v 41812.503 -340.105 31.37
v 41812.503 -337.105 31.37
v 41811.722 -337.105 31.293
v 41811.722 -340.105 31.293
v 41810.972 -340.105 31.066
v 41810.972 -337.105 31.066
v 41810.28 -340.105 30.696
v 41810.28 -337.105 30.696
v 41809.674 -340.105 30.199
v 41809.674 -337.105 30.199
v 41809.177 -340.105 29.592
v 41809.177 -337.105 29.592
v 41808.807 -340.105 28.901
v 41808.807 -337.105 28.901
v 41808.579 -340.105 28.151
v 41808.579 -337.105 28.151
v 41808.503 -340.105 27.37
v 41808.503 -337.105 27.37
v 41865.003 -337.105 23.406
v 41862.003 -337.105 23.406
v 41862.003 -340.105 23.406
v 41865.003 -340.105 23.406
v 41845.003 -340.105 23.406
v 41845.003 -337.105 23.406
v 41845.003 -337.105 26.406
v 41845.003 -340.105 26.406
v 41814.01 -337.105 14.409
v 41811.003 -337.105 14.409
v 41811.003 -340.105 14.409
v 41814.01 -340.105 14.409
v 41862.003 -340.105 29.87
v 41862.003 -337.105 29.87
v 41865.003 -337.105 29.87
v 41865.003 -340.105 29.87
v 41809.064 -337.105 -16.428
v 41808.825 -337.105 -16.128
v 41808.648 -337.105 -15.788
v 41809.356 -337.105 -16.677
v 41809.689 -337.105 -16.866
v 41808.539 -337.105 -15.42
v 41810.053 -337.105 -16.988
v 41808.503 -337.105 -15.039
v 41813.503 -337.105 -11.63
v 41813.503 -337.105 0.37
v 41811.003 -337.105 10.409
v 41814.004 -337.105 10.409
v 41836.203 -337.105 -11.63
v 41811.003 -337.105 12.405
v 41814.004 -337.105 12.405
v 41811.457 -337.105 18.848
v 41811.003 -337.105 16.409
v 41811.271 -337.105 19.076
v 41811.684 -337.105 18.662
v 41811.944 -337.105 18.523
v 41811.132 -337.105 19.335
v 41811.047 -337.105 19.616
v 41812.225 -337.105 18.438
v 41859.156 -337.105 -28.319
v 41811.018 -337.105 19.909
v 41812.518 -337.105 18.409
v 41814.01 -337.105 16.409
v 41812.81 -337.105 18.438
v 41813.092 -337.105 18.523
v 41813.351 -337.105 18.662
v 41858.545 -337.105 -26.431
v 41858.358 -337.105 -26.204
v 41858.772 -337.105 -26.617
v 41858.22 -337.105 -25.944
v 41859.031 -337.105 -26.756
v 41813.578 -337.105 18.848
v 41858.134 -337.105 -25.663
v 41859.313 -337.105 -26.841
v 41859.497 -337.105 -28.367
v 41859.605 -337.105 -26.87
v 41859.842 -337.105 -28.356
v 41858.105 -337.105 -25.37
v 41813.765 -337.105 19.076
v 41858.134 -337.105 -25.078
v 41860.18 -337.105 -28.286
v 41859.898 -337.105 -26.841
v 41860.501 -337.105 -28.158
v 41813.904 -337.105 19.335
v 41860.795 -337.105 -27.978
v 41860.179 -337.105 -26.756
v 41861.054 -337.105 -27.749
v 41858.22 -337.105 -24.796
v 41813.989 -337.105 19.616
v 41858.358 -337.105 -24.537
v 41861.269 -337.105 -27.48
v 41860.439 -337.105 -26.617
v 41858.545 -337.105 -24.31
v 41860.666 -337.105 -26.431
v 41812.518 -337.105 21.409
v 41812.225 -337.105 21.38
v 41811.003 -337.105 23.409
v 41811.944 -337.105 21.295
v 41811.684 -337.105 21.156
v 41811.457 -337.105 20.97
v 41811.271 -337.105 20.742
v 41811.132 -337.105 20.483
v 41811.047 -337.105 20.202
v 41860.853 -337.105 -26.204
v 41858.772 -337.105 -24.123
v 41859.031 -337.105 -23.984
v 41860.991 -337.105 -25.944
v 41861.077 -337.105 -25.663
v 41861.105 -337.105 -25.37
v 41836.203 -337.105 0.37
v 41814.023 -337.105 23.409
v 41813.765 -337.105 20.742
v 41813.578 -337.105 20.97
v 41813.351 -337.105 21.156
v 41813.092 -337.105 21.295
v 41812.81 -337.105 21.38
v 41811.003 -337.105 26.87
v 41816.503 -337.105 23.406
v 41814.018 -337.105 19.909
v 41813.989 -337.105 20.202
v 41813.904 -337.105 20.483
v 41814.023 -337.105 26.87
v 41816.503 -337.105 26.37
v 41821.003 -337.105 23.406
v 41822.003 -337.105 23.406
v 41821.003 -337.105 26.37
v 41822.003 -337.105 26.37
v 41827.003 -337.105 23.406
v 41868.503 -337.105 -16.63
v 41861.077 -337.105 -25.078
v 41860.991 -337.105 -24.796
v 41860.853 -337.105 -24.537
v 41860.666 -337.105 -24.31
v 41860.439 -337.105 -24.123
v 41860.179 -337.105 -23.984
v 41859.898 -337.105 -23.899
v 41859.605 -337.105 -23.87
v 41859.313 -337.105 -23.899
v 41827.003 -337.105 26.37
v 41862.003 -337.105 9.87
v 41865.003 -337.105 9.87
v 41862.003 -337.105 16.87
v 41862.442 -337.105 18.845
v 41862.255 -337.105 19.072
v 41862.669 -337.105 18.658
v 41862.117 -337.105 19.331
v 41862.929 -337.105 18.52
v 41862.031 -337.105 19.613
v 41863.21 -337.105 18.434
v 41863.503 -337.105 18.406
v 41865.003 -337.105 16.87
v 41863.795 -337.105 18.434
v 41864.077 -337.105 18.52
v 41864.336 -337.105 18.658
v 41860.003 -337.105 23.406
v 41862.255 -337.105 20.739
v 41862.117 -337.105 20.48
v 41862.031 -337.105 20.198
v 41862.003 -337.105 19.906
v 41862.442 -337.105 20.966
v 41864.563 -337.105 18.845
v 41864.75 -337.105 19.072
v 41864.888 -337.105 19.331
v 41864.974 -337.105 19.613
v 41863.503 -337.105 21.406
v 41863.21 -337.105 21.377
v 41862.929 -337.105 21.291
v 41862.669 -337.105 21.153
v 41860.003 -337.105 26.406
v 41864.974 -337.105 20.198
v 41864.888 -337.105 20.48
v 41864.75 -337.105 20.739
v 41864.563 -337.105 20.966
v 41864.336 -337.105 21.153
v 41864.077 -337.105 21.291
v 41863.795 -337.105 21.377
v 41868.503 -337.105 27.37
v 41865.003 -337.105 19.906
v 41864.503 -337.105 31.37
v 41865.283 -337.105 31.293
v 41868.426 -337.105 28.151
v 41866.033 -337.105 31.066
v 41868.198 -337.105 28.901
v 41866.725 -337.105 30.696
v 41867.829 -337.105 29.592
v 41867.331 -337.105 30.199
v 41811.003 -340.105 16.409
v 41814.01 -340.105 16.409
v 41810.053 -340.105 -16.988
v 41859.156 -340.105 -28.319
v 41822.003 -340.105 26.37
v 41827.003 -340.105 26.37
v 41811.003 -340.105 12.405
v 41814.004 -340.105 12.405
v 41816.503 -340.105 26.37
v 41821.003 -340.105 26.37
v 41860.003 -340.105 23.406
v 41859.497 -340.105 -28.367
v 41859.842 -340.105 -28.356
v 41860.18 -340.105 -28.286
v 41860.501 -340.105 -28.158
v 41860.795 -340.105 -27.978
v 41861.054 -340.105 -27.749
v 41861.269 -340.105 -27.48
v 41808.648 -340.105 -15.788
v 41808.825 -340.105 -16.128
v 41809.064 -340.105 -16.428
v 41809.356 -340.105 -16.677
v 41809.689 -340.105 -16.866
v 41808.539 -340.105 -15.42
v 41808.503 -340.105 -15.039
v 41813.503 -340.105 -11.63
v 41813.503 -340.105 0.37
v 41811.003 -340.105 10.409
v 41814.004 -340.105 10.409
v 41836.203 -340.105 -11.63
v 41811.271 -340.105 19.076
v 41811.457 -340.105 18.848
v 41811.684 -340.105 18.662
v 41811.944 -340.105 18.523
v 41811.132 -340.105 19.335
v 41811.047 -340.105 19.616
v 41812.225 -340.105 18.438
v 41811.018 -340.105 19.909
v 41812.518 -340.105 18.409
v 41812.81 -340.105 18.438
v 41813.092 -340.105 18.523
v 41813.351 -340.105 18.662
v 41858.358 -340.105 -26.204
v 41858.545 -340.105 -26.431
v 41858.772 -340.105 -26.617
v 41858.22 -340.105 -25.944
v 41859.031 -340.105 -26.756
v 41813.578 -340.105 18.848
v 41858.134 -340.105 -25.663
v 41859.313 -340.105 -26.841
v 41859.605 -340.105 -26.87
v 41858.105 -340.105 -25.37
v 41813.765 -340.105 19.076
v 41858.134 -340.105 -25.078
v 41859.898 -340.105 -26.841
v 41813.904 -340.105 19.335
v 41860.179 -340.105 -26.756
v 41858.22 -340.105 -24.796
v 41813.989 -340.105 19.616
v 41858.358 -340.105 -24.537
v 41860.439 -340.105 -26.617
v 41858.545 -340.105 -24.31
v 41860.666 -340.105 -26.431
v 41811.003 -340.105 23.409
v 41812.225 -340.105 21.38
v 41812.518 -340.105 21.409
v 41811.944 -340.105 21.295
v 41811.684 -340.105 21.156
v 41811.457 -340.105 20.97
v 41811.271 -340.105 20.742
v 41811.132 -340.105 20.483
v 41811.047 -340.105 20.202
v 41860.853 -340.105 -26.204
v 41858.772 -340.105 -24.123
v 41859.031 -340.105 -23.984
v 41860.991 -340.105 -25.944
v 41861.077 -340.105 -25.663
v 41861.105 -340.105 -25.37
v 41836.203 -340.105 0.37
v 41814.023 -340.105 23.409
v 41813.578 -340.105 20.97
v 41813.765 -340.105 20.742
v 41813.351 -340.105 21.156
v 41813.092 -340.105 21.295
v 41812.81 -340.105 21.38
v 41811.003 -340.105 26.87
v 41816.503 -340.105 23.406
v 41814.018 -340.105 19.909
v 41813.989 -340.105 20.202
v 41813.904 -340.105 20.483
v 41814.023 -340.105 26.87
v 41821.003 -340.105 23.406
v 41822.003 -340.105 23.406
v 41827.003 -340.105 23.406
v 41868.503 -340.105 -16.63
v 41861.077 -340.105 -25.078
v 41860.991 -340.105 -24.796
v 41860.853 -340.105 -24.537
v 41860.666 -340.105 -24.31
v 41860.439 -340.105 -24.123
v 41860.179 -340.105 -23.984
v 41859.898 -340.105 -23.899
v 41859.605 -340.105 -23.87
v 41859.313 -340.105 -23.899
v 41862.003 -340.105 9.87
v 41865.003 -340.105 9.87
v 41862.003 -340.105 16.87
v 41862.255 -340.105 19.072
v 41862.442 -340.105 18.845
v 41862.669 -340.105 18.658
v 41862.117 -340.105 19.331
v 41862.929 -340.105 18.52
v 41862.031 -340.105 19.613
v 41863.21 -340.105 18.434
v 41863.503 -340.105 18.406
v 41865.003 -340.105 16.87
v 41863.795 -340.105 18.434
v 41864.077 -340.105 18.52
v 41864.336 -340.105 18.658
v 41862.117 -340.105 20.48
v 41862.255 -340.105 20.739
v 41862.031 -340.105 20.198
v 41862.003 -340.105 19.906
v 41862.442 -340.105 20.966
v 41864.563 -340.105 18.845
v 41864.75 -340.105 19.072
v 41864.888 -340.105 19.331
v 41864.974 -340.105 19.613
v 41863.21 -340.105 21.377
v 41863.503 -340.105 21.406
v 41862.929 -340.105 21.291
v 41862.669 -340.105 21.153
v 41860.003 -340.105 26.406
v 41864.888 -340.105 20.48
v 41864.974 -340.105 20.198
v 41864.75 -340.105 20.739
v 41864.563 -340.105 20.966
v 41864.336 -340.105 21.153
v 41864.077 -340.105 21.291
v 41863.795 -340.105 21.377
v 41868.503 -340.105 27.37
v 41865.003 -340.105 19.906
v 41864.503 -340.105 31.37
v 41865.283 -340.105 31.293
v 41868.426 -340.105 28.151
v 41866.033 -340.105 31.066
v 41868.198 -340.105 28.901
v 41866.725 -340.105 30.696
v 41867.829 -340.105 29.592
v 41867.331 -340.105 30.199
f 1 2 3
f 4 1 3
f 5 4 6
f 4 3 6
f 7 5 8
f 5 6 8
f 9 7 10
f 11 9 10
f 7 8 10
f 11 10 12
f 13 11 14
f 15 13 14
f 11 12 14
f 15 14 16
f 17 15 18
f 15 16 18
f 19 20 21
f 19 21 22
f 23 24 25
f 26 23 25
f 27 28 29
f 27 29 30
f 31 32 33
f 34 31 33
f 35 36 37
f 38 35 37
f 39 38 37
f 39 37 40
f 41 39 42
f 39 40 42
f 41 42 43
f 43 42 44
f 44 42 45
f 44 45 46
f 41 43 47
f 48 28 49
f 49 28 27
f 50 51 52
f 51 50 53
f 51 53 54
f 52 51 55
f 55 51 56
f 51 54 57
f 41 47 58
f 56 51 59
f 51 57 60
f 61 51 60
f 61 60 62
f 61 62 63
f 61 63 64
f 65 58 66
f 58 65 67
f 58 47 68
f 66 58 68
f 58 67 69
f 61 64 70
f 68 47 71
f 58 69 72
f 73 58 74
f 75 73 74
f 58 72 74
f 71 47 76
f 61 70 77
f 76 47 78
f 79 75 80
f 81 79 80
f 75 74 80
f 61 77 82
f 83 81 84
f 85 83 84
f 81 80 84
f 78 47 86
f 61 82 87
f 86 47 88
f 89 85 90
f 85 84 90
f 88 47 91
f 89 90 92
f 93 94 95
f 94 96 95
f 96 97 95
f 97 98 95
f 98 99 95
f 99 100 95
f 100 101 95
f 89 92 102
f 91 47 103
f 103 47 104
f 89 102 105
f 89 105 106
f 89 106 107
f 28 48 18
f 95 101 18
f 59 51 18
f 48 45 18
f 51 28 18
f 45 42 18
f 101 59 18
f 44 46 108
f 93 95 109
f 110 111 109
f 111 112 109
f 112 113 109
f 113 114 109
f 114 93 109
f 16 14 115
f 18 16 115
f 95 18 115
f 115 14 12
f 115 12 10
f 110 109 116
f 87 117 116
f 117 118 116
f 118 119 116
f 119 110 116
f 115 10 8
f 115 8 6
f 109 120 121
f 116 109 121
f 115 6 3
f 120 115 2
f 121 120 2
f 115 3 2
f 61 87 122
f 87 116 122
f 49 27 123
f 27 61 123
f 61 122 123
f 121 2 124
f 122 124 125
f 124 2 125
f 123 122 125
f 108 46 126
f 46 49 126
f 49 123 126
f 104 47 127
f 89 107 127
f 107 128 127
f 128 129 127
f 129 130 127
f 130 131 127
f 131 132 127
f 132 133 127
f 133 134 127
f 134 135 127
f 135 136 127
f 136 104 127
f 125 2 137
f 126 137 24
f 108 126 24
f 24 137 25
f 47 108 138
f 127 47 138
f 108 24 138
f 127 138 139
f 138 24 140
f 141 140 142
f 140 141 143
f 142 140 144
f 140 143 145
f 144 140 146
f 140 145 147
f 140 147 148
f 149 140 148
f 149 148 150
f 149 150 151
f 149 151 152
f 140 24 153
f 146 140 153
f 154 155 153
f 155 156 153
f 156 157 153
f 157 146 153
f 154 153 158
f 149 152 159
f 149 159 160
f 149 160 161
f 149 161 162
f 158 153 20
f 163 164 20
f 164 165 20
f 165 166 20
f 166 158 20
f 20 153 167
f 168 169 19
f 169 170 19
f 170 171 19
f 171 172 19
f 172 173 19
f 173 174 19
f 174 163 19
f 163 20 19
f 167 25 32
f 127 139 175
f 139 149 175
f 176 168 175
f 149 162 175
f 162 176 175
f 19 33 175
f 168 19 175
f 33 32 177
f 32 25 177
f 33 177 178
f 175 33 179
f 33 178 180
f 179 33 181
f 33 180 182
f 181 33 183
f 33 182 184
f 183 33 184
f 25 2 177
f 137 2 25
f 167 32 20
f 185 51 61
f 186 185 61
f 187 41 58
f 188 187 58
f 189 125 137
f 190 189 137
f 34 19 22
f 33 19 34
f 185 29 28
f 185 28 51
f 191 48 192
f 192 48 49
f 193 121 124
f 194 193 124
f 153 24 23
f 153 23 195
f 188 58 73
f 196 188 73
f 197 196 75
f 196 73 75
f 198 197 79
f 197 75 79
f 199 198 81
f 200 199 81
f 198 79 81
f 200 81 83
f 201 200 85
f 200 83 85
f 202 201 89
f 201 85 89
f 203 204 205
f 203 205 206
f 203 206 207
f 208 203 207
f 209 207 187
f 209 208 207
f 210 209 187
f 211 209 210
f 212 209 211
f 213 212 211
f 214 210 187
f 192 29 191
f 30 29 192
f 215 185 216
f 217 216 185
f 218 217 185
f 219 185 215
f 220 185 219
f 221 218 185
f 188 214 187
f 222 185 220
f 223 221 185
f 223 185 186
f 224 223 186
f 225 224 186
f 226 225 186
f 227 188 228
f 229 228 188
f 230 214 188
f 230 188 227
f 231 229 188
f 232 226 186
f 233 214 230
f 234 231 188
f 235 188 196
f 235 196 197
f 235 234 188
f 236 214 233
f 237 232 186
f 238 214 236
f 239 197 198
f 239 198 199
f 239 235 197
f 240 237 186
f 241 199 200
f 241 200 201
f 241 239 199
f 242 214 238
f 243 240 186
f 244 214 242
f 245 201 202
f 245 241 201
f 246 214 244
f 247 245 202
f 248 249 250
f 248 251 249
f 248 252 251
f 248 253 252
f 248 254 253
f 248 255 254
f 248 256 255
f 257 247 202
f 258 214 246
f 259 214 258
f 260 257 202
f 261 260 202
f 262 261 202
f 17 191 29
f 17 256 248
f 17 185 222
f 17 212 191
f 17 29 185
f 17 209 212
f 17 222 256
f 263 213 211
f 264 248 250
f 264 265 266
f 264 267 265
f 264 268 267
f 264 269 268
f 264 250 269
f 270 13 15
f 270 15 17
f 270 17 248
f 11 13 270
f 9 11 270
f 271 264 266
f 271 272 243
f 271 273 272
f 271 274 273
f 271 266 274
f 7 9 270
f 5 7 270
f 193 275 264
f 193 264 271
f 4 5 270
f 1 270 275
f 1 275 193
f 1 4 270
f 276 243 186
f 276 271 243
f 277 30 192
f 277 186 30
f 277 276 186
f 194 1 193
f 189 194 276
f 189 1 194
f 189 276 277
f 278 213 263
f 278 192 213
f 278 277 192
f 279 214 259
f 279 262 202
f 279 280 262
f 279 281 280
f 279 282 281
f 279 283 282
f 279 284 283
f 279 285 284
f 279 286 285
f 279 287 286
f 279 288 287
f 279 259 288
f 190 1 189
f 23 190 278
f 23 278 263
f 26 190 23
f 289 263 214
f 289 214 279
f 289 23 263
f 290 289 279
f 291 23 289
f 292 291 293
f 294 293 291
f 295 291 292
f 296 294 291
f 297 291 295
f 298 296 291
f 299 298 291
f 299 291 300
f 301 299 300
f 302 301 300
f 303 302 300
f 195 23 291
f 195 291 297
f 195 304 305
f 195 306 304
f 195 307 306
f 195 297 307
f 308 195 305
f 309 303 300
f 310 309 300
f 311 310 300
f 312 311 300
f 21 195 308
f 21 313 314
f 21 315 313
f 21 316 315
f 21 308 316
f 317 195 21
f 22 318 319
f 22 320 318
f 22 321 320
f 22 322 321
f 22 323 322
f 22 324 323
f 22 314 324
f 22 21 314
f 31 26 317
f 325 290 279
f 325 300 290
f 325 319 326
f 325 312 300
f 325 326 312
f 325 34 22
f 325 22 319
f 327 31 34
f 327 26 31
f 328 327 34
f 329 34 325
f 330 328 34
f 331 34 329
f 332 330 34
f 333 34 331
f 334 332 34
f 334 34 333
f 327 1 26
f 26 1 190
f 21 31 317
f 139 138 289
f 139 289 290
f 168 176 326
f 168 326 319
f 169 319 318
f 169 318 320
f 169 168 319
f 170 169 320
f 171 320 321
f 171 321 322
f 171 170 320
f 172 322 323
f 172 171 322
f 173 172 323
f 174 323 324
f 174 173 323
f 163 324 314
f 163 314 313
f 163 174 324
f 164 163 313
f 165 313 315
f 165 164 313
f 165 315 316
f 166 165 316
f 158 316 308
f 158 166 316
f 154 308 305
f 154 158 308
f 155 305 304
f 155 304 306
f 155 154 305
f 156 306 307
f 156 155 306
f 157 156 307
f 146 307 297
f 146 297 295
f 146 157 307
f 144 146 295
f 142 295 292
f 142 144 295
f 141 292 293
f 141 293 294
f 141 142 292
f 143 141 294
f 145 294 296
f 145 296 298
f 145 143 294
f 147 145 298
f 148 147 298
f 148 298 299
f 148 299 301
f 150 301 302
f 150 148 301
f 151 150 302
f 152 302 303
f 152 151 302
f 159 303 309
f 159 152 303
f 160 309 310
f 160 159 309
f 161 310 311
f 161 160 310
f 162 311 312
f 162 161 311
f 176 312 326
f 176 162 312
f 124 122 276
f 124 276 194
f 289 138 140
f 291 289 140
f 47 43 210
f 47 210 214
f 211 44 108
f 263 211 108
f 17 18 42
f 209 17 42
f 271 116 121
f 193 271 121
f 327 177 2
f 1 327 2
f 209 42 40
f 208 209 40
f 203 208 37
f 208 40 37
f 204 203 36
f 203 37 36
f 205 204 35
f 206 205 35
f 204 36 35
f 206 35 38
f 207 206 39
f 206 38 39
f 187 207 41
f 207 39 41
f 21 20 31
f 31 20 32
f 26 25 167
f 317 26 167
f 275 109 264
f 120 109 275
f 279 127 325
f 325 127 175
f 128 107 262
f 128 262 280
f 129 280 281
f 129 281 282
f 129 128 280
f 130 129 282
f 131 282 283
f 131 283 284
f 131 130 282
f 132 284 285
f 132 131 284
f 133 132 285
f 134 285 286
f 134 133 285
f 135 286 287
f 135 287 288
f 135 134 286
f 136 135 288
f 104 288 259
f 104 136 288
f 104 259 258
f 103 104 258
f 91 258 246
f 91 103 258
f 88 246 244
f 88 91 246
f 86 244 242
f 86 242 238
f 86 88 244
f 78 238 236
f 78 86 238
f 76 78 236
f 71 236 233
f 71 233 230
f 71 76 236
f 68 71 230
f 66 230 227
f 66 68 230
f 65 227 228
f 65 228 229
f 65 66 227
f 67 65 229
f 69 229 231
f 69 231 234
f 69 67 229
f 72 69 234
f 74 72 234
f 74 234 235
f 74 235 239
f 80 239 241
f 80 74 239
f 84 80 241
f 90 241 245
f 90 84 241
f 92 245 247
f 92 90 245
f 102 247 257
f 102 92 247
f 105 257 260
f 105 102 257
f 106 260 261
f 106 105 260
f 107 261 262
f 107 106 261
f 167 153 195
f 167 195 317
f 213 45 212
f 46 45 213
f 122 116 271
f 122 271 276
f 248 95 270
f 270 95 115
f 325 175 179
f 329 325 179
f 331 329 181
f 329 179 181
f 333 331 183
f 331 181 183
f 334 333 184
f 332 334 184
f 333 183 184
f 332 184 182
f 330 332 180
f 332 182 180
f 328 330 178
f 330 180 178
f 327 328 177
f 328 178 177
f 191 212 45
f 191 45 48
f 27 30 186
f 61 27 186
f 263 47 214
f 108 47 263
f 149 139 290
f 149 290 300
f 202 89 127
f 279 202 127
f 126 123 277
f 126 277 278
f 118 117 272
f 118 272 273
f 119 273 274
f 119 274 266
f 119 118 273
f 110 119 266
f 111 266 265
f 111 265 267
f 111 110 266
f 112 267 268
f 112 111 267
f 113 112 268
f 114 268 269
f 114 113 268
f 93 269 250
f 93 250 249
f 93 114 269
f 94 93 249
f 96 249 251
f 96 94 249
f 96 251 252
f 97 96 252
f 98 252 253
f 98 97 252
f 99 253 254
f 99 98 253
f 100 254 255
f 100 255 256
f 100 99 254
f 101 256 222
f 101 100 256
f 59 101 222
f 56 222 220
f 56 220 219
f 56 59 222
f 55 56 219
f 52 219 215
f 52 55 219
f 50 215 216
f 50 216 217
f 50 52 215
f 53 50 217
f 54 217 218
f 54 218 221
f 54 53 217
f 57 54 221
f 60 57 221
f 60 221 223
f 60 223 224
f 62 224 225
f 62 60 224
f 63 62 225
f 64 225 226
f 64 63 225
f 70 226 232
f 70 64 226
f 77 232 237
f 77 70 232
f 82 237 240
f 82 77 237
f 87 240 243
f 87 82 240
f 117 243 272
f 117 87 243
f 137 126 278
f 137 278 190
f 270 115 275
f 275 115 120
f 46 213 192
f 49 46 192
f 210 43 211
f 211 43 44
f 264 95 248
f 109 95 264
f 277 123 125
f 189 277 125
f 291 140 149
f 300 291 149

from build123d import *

# Parameters (mm, degrees)
CROQUIS1_R                 = 1.5
CROQUIS1_W                 = 3
CROQUIS1_H                 = 6.464673287
CROQUIS1_W_2               = 3.020034148
CROQUIS1_H_2               = 3.461191377
CROQUIS1_W_3               = 4.5
CROQUIS1_H_3               = 2.964673291
CROQUIS1_W_4               = 5
CROQUIS1_W_5               = 15
CROQUIS1_H_4               = 3
CROQUIS1_H_5               = 7
CROQUIS1_W_6               = 3.007385003
CROQUIS1_H_6               = 1.999998024
CROQUIS1_W_7               = 3.001763161
CROQUIS1_H_7               = 1.995781642
CROQUIS1_W_8               = 22.700000001
CROQUIS1_H_8               = 12
SALIENTE_EXTRUIR1_DEPTH    = 3
S_LIDO_MOVER_COPIAR1_ANGLE = 90


with BuildPart() as part:
    # Croquis1 → Saliente-Extruir1 (new body)
    with BuildSketch(Plane.XY):
        with BuildLine():
            Line((41808.502638122, -312.734450912), (41808.502638122, -355.143425671))
            ThreePointArc((41808.502638122, -355.143425671), (41808.937480298, -356.388528473), (41810.052919108, -357.092208062))
            Line((41810.052919108, -357.092208062), (41859.155637399, -368.423604591))
            ThreePointArc((41859.155637399, -368.423604591), (41860.343476449, -368.333633328), (41861.269457002, -367.584222592))
            Line((41861.269457002, -367.584222592), (41868.502638122, -356.734450911))
            Line((41868.502638122, -356.734450911), (41868.502638122, -312.734450912))
            ThreePointArc((41868.502638122, -312.734450912), (41867.331065246, -309.906023787), (41864.502638122, -308.734450912))
            Line((41864.502638122, -308.734450912), (41812.502638122, -308.734450912))
            ThreePointArc((41812.502638122, -308.734450912), (41809.674210997, -309.906023787), (41808.502638122, -312.734450912))
        make_face()
        with Locations((41859.605356413, -365.4748222)):
            Circle(CROQUIS1_R, mode=Mode.SUBTRACT)
        with Locations((41812.517756121, -320.195638832)):
            Circle(CROQUIS1_R, mode=Mode.SUBTRACT)
        with Locations((41863.502638122, -320.199124199)):
            Circle(CROQUIS1_R, mode=Mode.SUBTRACT)
        with Locations((41863.502638122, -313.466787555)):
            Rectangle(CROQUIS1_W, CROQUIS1_H, mode=Mode.SUBTRACT)
        with Locations((41812.512655196, -314.965046601)):
            Rectangle(CROQUIS1_W_2, CROQUIS1_H_2, mode=Mode.SUBTRACT)
        with Locations((41818.752638122, -315.216787557)):
            Rectangle(CROQUIS1_W_3, CROQUIS1_H_3, mode=Mode.SUBTRACT)
        with Locations((41824.502638122, -315.216787557)):
            Rectangle(CROQUIS1_W_4, CROQUIS1_H_3, mode=Mode.SUBTRACT)
        with Locations((41852.502638122, -315.199124203)):
            Rectangle(CROQUIS1_W_5, CROQUIS1_H_4, mode=Mode.SUBTRACT)
        with Locations((41863.502638122, -326.734450912)):
            Rectangle(CROQUIS1_W, CROQUIS1_H_5, mode=Mode.SUBTRACT)
        with Locations((41812.506330624, -324.695634388)):
            Rectangle(CROQUIS1_W_6, CROQUIS1_H_6, mode=Mode.SUBTRACT)
        with Locations((41812.503519702, -328.697738628)):
            Rectangle(CROQUIS1_W_7, CROQUIS1_H_7, mode=Mode.SUBTRACT)
        with Locations((41824.852638123, -345.734450912)):
            Rectangle(CROQUIS1_W_8, CROQUIS1_H_8, mode=Mode.SUBTRACT)
    extrude(amount=SALIENTE_EXTRUIR1_DEPTH)


with BuildPart() as part_1:
    # Sólido-Mover/Copiar1: moved
    add(part.part.rotate(Axis((0, -338.604636556, 1.5), (1, 0, 0)), S_LIDO_MOVER_COPIAR1_ANGLE))


solid = part_1.part
